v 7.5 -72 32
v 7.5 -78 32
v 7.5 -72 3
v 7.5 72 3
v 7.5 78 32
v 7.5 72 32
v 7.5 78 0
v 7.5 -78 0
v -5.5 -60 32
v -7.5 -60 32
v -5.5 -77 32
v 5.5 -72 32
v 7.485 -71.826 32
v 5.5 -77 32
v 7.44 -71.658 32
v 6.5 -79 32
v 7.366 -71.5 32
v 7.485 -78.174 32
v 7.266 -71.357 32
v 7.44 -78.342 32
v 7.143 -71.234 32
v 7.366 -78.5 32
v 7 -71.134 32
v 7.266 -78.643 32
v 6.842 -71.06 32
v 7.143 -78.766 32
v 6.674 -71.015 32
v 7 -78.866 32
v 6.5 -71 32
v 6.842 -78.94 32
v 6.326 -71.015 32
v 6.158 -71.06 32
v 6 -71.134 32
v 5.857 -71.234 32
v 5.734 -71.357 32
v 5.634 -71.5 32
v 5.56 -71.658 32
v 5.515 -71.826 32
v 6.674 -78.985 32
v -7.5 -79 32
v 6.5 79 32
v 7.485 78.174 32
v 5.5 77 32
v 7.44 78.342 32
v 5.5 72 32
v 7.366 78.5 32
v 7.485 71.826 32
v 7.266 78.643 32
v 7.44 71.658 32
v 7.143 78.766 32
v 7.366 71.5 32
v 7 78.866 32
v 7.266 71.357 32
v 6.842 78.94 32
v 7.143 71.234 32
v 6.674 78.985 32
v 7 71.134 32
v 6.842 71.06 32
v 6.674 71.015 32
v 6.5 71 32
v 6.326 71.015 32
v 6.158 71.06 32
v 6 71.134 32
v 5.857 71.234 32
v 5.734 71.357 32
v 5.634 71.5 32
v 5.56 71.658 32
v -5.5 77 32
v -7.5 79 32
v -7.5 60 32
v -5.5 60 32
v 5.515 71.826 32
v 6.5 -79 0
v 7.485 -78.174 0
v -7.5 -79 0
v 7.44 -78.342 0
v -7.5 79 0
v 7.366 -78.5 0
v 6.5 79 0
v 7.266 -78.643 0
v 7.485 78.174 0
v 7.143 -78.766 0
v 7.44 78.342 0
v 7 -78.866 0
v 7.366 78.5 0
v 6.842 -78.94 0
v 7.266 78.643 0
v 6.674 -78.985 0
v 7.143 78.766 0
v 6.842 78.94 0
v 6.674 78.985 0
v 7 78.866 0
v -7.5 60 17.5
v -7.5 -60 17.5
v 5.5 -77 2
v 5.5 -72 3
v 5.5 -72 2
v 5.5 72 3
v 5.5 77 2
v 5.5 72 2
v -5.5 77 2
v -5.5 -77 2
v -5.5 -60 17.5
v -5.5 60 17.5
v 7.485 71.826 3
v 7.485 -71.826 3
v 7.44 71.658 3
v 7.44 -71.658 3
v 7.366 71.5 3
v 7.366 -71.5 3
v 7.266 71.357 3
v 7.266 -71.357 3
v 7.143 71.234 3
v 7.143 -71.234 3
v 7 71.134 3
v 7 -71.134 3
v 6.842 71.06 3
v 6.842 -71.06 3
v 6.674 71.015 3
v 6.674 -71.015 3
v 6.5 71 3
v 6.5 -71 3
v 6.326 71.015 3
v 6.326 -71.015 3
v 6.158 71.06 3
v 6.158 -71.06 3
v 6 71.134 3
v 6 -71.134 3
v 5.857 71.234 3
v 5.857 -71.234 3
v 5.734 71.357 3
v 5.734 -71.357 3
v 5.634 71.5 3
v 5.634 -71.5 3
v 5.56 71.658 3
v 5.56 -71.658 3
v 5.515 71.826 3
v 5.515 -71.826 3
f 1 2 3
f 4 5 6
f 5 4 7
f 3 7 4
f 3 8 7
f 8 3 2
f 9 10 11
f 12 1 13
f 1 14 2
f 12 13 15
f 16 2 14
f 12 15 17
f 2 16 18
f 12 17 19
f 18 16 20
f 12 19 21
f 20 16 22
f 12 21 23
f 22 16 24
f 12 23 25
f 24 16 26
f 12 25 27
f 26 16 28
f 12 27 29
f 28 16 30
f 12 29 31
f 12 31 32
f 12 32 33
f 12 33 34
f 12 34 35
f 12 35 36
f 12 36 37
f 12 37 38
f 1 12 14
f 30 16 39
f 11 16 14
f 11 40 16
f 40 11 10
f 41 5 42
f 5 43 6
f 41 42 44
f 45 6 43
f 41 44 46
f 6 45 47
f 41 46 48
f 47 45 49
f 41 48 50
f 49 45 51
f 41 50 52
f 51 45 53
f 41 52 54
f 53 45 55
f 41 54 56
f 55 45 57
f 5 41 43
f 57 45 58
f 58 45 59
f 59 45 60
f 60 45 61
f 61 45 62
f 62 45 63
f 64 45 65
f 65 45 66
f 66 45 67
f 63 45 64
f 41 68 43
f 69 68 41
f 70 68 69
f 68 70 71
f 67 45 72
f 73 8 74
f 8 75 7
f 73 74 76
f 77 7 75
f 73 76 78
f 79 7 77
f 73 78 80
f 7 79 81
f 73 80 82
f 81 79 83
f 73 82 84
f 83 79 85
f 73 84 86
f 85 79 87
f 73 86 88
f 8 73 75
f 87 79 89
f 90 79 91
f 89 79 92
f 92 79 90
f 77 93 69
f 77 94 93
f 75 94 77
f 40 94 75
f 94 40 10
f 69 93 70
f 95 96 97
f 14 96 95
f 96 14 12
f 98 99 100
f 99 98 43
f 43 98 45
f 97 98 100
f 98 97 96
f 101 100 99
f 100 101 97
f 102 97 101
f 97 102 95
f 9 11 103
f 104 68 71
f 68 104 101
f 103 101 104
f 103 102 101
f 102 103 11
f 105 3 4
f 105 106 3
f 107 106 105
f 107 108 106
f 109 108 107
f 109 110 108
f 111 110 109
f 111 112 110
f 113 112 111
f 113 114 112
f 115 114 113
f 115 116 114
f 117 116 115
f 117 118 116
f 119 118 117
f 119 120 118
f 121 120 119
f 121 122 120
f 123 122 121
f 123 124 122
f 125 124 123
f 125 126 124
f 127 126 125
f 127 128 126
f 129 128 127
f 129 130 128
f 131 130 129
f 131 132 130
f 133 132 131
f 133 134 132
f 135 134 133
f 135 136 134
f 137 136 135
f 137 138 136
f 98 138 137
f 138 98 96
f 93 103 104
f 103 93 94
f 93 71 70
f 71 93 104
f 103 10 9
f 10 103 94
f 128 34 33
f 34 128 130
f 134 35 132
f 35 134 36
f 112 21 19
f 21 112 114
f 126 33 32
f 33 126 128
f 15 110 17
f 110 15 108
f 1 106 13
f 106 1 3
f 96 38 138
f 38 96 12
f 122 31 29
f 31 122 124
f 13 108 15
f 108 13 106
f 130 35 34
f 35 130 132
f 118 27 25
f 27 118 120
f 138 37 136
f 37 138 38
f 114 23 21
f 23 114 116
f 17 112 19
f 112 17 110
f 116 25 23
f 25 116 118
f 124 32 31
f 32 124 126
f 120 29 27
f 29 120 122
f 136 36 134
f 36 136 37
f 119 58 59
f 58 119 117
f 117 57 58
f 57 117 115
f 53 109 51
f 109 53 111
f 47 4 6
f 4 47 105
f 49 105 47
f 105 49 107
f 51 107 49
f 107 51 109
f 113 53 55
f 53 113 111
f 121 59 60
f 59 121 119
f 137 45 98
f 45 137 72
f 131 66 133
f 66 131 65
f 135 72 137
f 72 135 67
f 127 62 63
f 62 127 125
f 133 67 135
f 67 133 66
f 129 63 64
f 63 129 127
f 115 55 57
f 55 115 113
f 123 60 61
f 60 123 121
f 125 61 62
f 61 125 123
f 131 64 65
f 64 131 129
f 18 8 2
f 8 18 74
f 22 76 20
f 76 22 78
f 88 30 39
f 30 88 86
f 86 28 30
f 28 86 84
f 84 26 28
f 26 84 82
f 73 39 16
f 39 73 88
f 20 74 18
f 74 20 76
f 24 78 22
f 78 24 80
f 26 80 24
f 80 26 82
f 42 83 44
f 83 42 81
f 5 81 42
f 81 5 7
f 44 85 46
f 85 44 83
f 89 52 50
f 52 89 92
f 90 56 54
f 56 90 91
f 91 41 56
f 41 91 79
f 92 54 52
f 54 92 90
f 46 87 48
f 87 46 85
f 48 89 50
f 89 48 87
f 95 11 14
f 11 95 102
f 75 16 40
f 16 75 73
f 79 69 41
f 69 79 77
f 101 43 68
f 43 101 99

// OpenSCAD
// Definition size of housing
// **************************

sizex = 51;
sizey = 51;
depth = 10;
thick = 2;
gap=2.5;

//Definition of circle angular resolution
$fn = 36;  


union () {
 difference () {
 
     // main block
   translate ([0,0,16]) {
     cube ( [15,156,32], center = true );
   };


   
     
   //remove inner
   translate ([0,0,32]) {
   cube ( [11,156,60], center = true);
   };
   translate ([2,0,33]) {
   cube ( [14,144,60], center = true);
   };
   translate ([-2,0,35]) {
   cube ( [14,120,35], center = true);
   };

   /*translate ([8,0,60]) rotate([0,45,0]) {
   cube ( [20,170,20], center = true);
   };*/

   

         
 };      
 
 //add support fins


   translate ([6.5,-72,0]) {
   cylinder (32,1,true);
   };
   translate ([6.5,72,0]) {
   cylinder (32,1,true);
   };

   translate ([6.5,-78,0]) {
   cylinder (32,1,true);
   };
   translate ([6.5,78,0]) {
   cylinder (32,1,true);
   };

 
   translate ([-0.5,-78,16]) {
     cube ( [14,2,32], center = true );
   };

   translate ([-0.5,78,16]) {
     cube ( [14,2,32], center = true );
   };


 
}
